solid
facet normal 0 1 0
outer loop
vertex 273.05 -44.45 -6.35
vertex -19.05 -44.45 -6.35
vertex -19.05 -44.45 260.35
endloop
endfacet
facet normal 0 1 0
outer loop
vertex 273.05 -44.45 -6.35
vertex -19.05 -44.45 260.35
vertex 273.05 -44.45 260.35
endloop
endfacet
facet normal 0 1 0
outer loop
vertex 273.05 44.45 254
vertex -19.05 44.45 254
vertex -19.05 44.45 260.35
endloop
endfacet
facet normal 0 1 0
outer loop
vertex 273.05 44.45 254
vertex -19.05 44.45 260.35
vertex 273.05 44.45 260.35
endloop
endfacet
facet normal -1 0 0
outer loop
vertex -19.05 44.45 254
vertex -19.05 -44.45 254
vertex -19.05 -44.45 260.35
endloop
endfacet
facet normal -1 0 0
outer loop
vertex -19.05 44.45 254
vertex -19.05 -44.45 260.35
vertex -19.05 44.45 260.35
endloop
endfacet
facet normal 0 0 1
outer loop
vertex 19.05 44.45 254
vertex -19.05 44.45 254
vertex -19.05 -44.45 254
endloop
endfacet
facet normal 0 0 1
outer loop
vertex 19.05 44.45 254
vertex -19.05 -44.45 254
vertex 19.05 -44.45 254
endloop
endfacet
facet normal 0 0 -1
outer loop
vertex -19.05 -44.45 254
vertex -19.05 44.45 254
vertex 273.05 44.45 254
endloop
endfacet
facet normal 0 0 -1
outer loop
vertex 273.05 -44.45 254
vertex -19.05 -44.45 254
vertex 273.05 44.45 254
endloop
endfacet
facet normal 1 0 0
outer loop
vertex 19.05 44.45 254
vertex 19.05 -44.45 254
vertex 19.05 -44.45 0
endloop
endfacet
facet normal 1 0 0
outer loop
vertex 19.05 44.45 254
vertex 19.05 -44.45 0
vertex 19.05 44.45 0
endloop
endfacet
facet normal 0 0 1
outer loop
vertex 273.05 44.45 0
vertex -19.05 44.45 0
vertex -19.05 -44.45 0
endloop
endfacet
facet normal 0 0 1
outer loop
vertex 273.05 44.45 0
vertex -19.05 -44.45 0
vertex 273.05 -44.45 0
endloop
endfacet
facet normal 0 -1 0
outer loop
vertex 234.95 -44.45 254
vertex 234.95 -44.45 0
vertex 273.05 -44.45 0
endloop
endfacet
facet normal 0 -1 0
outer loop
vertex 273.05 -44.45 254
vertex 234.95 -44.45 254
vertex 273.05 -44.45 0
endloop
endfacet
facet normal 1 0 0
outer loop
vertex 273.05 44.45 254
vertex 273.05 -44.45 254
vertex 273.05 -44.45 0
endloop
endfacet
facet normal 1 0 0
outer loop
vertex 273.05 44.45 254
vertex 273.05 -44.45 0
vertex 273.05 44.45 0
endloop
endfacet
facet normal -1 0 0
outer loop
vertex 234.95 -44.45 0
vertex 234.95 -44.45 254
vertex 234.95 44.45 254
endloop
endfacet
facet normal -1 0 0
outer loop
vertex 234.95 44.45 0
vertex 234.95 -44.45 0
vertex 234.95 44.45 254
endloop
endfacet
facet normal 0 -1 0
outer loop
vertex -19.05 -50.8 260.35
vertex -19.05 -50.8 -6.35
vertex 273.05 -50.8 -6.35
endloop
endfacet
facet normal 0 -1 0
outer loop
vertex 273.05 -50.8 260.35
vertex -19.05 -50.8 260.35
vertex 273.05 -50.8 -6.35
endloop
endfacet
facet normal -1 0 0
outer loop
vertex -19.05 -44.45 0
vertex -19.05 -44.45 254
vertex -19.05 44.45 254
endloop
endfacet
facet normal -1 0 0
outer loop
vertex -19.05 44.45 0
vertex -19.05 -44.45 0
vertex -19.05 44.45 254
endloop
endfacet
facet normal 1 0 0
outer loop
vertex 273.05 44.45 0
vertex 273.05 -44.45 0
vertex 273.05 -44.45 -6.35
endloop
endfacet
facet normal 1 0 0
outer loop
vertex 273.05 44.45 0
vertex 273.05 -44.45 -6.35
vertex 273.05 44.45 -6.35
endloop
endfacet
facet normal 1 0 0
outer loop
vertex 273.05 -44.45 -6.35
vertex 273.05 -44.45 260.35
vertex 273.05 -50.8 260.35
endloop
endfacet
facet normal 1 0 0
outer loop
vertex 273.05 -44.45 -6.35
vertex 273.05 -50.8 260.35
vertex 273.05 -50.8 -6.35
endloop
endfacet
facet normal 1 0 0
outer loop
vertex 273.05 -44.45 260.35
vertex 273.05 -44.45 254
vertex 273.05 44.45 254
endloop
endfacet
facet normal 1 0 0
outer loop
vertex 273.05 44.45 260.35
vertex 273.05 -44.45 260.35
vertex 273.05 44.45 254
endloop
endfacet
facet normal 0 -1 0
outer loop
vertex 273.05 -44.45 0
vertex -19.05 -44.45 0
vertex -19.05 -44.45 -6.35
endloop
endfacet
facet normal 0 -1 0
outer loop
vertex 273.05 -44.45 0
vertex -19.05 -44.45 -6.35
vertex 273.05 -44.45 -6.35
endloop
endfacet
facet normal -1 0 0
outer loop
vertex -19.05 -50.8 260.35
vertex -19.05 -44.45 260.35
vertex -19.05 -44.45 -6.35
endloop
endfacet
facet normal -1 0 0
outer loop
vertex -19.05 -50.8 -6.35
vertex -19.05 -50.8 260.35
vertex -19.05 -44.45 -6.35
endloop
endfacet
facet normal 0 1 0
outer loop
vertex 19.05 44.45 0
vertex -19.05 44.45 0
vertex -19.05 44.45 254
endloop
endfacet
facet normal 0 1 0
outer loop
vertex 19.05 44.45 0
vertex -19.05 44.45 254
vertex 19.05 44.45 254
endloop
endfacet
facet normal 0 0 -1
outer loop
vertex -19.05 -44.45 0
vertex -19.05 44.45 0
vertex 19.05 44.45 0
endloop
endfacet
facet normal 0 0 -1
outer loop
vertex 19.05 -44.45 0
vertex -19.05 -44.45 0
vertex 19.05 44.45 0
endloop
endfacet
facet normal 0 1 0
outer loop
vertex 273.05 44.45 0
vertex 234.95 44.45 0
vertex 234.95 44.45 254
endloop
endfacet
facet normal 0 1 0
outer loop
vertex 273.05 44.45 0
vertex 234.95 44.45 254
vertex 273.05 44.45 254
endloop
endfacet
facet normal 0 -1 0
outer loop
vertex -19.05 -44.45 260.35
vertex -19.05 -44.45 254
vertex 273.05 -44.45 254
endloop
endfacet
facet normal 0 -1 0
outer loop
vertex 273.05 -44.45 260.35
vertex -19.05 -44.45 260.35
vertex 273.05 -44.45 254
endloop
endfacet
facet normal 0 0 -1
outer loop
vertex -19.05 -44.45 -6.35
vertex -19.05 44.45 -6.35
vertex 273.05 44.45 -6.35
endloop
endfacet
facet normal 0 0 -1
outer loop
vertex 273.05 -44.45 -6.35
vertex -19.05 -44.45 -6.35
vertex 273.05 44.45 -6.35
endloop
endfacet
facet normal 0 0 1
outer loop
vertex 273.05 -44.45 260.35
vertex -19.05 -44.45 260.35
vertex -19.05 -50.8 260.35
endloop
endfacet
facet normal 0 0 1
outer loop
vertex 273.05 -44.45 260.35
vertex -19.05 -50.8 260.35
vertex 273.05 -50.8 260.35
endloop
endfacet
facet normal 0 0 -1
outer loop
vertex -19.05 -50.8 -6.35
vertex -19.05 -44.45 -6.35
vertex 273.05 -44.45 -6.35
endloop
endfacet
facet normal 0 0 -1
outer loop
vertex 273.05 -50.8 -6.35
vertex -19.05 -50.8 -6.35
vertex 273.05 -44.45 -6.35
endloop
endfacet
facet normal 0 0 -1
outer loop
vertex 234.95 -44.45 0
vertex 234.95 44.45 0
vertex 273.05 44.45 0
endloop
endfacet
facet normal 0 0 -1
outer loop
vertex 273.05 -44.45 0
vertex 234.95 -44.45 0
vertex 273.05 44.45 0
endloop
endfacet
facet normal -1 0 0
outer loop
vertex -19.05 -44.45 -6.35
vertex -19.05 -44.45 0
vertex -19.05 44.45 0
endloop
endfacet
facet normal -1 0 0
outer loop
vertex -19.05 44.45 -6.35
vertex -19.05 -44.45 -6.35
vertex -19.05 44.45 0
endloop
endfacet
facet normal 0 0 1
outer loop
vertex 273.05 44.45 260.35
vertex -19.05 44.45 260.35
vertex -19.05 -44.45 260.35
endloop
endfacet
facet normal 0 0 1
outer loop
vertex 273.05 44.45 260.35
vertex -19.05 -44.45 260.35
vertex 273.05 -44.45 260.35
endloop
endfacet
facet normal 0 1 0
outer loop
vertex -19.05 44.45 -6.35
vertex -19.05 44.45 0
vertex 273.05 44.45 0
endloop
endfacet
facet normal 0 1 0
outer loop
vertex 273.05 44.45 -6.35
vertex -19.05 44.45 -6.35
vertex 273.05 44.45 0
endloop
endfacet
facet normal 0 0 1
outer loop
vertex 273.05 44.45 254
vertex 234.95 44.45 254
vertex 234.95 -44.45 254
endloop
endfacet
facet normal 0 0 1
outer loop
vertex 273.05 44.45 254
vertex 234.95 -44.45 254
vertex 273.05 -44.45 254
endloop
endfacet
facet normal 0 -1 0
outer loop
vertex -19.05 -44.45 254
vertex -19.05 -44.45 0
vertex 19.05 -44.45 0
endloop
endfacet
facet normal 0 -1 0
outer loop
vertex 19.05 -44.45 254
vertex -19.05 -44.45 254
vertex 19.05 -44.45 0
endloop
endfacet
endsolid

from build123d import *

# Parameters (mm, degrees)
SKETCH1_W             = 38.1
SKETCH1_H             = 88.9
BOSS_EXTRUDE1_DEPTH   = 254
BOSS_EXTRUDE1_2_DEPTH = 254
SKETCH2_W             = 292.1
SKETCH2_H             = 88.9
BOSS_EXTRUDE2_DEPTH   = 6.35
BOSS_EXTRUDE3_START   = 254
SKETCH2_2_W           = 292.1
SKETCH2_2_H           = 88.9
BOSS_EXTRUDE3_DEPTH   = 6.35
BOSS_EXTRUDE4_START   = -44.45
SKETCH3_W             = 292.1
SKETCH3_H             = 266.7
BOSS_EXTRUDE4_DEPTH   = 6.35


with BuildPart() as part:
    # Sketch1 → Boss-Extrude1 (new body)
    with BuildSketch(Plane.XY):
        Rectangle(SKETCH1_W, SKETCH1_H)
    extrude(amount=BOSS_EXTRUDE1_DEPTH)


with BuildPart() as body_2:
    # Sketch1 → Boss-Extrude1 2 (new body)
    with BuildSketch(Plane.XY):
        with Locations((254, 0)):
            Rectangle(SKETCH1_W, SKETCH1_H)
    extrude(amount=BOSS_EXTRUDE1_2_DEPTH)


with BuildPart() as body_3:
    # Sketch2 → Boss-Extrude2 (new body)
    with BuildSketch(Plane.XY):
        with Locations((127, 0)):
            Rectangle(SKETCH2_W, SKETCH2_H)
    extrude(amount=-BOSS_EXTRUDE2_DEPTH)


with BuildPart() as body_4:
    # Sketch2<2> → Boss-Extrude3 (new body)
    with BuildSketch(Plane.XY.offset(BOSS_EXTRUDE3_START)):
        with Locations((127, 0)):
            Rectangle(SKETCH2_2_W, SKETCH2_2_H)
    extrude(amount=BOSS_EXTRUDE3_DEPTH)


with BuildPart() as body_5:
    # Sketch3 → Boss-Extrude4 (new body)
    with BuildSketch(Plane(origin=(0, 0, 0), x_dir=(1, 0, 0), z_dir=(0, 1, 0)).offset(BOSS_EXTRUDE4_START)):
        with Locations((127, -127)):
            Rectangle(SKETCH3_W, SKETCH3_H)
    extrude(amount=-BOSS_EXTRUDE4_DEPTH)


solid = Compound([part.part, body_2.part, body_3.part, body_4.part, body_5.part])
